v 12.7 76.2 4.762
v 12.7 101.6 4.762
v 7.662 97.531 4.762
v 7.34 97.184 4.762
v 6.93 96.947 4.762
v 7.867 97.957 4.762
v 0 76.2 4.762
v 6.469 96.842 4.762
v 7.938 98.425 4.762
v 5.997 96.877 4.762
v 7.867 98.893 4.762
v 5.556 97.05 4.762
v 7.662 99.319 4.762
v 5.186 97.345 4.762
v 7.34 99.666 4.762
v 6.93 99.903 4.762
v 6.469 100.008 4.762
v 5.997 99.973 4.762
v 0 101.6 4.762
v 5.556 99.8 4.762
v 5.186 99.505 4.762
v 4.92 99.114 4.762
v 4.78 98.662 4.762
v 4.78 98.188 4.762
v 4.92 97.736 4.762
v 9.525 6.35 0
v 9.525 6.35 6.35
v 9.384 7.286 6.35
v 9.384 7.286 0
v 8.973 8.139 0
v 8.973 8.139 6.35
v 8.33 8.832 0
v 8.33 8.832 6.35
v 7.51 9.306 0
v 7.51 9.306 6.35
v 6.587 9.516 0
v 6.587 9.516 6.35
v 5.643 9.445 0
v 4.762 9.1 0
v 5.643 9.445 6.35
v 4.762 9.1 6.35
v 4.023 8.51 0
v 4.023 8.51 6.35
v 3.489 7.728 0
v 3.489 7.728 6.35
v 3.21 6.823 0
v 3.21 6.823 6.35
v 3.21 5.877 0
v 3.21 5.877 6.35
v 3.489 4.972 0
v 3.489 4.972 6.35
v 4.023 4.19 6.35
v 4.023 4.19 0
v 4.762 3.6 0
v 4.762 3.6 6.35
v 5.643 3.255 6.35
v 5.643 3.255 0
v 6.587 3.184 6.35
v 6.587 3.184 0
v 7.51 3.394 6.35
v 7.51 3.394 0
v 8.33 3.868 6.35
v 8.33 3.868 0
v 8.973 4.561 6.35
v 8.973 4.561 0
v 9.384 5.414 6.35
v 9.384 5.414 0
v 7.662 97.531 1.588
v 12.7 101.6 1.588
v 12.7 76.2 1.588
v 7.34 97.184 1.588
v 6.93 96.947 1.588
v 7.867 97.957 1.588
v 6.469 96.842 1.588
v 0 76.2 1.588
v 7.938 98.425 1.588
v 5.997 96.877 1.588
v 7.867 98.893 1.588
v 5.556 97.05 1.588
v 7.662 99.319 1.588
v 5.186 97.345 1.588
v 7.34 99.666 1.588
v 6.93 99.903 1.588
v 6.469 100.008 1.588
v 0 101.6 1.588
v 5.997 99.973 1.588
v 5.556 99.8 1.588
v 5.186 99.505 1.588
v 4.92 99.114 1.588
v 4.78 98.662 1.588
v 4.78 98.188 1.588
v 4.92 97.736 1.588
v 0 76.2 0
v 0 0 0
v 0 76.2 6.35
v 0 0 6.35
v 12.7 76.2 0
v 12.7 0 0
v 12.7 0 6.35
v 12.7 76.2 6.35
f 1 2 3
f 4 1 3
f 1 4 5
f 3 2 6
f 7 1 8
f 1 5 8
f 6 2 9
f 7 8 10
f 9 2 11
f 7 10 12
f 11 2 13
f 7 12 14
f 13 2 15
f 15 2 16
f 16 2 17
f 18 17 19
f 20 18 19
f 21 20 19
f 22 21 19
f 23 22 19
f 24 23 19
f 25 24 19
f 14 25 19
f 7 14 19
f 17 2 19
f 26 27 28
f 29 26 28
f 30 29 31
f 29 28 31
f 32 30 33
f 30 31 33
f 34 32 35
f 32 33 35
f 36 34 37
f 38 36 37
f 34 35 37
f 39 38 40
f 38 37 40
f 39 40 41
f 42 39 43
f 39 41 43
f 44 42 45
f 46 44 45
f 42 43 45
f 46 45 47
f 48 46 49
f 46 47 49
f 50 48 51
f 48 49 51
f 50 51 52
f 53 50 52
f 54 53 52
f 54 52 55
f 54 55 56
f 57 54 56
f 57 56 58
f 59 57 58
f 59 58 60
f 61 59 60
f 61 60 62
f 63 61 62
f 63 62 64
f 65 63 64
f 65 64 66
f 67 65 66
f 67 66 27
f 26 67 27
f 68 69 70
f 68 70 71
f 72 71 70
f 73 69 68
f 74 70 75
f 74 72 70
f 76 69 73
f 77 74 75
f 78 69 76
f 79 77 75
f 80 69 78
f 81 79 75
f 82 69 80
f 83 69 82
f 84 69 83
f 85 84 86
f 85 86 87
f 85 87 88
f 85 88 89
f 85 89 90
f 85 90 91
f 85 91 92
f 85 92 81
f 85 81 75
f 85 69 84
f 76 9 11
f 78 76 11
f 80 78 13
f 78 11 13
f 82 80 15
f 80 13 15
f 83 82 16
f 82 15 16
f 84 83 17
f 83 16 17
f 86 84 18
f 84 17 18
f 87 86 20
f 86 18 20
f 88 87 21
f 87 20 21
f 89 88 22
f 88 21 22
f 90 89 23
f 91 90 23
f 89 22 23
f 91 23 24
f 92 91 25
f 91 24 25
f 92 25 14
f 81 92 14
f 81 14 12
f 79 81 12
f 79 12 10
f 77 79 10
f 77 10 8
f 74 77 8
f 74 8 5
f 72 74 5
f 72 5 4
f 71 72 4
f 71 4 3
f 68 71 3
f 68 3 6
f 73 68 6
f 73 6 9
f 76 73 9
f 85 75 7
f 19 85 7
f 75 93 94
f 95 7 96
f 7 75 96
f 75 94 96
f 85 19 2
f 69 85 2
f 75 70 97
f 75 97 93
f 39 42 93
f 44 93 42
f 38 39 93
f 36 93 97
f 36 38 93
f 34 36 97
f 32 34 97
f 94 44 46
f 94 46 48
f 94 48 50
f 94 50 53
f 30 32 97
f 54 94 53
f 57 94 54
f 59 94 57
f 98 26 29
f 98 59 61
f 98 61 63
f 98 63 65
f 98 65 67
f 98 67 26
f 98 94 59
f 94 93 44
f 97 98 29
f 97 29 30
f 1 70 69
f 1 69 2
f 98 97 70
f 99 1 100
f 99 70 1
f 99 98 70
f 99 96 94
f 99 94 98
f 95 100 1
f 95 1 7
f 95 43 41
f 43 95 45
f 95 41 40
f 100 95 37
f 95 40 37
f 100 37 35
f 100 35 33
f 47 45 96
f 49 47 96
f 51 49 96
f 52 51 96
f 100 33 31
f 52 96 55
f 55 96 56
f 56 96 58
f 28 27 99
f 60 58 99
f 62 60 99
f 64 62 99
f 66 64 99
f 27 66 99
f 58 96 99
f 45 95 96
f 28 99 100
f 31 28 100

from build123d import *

# Parameters (mm, degrees)
F0_W     = 12.7
F0_H     = 6.35
F1_DEPTH = 101.6
F2_R     = 1.5875
F2_R_2   = 3.175
F3_DEPTH = 6.351
F4_W     = 12.7
F4_H     = 1.5875
F5_DEPTH = 25.4


with BuildPart() as f1:
    # F0 (on Front) → F1 (new body)
    with BuildSketch(Plane.XZ):
        with Locations((6.35, 3.175)):
            Rectangle(F0_W, F0_H)
    extrude(amount=-F1_DEPTH)

    # F2 (on face) → F3 (cut, through all)
    with BuildSketch(Plane.XY.offset(6.35)):
        with Locations((6.35, 98.425)):
            Circle(F2_R)
        with Locations((6.35, 6.35)):
            Circle(F2_R_2)
    extrude(amount=-F3_DEPTH, mode=Mode.SUBTRACT)

    # F4 (on face) → F5 (cut)
    with BuildSketch(Plane(origin=(0, 101.6, 0), x_dir=(-1, 0, 0), z_dir=(0, 1, 0))):
        with Locations((-6.35, 5.55625)):
            Rectangle(F4_W, F4_H)
        with Locations((-6.35, 0.79375)):
            Rectangle(F4_W, F4_H)
    extrude(amount=-F5_DEPTH, mode=Mode.SUBTRACT)


solid = f1.part
